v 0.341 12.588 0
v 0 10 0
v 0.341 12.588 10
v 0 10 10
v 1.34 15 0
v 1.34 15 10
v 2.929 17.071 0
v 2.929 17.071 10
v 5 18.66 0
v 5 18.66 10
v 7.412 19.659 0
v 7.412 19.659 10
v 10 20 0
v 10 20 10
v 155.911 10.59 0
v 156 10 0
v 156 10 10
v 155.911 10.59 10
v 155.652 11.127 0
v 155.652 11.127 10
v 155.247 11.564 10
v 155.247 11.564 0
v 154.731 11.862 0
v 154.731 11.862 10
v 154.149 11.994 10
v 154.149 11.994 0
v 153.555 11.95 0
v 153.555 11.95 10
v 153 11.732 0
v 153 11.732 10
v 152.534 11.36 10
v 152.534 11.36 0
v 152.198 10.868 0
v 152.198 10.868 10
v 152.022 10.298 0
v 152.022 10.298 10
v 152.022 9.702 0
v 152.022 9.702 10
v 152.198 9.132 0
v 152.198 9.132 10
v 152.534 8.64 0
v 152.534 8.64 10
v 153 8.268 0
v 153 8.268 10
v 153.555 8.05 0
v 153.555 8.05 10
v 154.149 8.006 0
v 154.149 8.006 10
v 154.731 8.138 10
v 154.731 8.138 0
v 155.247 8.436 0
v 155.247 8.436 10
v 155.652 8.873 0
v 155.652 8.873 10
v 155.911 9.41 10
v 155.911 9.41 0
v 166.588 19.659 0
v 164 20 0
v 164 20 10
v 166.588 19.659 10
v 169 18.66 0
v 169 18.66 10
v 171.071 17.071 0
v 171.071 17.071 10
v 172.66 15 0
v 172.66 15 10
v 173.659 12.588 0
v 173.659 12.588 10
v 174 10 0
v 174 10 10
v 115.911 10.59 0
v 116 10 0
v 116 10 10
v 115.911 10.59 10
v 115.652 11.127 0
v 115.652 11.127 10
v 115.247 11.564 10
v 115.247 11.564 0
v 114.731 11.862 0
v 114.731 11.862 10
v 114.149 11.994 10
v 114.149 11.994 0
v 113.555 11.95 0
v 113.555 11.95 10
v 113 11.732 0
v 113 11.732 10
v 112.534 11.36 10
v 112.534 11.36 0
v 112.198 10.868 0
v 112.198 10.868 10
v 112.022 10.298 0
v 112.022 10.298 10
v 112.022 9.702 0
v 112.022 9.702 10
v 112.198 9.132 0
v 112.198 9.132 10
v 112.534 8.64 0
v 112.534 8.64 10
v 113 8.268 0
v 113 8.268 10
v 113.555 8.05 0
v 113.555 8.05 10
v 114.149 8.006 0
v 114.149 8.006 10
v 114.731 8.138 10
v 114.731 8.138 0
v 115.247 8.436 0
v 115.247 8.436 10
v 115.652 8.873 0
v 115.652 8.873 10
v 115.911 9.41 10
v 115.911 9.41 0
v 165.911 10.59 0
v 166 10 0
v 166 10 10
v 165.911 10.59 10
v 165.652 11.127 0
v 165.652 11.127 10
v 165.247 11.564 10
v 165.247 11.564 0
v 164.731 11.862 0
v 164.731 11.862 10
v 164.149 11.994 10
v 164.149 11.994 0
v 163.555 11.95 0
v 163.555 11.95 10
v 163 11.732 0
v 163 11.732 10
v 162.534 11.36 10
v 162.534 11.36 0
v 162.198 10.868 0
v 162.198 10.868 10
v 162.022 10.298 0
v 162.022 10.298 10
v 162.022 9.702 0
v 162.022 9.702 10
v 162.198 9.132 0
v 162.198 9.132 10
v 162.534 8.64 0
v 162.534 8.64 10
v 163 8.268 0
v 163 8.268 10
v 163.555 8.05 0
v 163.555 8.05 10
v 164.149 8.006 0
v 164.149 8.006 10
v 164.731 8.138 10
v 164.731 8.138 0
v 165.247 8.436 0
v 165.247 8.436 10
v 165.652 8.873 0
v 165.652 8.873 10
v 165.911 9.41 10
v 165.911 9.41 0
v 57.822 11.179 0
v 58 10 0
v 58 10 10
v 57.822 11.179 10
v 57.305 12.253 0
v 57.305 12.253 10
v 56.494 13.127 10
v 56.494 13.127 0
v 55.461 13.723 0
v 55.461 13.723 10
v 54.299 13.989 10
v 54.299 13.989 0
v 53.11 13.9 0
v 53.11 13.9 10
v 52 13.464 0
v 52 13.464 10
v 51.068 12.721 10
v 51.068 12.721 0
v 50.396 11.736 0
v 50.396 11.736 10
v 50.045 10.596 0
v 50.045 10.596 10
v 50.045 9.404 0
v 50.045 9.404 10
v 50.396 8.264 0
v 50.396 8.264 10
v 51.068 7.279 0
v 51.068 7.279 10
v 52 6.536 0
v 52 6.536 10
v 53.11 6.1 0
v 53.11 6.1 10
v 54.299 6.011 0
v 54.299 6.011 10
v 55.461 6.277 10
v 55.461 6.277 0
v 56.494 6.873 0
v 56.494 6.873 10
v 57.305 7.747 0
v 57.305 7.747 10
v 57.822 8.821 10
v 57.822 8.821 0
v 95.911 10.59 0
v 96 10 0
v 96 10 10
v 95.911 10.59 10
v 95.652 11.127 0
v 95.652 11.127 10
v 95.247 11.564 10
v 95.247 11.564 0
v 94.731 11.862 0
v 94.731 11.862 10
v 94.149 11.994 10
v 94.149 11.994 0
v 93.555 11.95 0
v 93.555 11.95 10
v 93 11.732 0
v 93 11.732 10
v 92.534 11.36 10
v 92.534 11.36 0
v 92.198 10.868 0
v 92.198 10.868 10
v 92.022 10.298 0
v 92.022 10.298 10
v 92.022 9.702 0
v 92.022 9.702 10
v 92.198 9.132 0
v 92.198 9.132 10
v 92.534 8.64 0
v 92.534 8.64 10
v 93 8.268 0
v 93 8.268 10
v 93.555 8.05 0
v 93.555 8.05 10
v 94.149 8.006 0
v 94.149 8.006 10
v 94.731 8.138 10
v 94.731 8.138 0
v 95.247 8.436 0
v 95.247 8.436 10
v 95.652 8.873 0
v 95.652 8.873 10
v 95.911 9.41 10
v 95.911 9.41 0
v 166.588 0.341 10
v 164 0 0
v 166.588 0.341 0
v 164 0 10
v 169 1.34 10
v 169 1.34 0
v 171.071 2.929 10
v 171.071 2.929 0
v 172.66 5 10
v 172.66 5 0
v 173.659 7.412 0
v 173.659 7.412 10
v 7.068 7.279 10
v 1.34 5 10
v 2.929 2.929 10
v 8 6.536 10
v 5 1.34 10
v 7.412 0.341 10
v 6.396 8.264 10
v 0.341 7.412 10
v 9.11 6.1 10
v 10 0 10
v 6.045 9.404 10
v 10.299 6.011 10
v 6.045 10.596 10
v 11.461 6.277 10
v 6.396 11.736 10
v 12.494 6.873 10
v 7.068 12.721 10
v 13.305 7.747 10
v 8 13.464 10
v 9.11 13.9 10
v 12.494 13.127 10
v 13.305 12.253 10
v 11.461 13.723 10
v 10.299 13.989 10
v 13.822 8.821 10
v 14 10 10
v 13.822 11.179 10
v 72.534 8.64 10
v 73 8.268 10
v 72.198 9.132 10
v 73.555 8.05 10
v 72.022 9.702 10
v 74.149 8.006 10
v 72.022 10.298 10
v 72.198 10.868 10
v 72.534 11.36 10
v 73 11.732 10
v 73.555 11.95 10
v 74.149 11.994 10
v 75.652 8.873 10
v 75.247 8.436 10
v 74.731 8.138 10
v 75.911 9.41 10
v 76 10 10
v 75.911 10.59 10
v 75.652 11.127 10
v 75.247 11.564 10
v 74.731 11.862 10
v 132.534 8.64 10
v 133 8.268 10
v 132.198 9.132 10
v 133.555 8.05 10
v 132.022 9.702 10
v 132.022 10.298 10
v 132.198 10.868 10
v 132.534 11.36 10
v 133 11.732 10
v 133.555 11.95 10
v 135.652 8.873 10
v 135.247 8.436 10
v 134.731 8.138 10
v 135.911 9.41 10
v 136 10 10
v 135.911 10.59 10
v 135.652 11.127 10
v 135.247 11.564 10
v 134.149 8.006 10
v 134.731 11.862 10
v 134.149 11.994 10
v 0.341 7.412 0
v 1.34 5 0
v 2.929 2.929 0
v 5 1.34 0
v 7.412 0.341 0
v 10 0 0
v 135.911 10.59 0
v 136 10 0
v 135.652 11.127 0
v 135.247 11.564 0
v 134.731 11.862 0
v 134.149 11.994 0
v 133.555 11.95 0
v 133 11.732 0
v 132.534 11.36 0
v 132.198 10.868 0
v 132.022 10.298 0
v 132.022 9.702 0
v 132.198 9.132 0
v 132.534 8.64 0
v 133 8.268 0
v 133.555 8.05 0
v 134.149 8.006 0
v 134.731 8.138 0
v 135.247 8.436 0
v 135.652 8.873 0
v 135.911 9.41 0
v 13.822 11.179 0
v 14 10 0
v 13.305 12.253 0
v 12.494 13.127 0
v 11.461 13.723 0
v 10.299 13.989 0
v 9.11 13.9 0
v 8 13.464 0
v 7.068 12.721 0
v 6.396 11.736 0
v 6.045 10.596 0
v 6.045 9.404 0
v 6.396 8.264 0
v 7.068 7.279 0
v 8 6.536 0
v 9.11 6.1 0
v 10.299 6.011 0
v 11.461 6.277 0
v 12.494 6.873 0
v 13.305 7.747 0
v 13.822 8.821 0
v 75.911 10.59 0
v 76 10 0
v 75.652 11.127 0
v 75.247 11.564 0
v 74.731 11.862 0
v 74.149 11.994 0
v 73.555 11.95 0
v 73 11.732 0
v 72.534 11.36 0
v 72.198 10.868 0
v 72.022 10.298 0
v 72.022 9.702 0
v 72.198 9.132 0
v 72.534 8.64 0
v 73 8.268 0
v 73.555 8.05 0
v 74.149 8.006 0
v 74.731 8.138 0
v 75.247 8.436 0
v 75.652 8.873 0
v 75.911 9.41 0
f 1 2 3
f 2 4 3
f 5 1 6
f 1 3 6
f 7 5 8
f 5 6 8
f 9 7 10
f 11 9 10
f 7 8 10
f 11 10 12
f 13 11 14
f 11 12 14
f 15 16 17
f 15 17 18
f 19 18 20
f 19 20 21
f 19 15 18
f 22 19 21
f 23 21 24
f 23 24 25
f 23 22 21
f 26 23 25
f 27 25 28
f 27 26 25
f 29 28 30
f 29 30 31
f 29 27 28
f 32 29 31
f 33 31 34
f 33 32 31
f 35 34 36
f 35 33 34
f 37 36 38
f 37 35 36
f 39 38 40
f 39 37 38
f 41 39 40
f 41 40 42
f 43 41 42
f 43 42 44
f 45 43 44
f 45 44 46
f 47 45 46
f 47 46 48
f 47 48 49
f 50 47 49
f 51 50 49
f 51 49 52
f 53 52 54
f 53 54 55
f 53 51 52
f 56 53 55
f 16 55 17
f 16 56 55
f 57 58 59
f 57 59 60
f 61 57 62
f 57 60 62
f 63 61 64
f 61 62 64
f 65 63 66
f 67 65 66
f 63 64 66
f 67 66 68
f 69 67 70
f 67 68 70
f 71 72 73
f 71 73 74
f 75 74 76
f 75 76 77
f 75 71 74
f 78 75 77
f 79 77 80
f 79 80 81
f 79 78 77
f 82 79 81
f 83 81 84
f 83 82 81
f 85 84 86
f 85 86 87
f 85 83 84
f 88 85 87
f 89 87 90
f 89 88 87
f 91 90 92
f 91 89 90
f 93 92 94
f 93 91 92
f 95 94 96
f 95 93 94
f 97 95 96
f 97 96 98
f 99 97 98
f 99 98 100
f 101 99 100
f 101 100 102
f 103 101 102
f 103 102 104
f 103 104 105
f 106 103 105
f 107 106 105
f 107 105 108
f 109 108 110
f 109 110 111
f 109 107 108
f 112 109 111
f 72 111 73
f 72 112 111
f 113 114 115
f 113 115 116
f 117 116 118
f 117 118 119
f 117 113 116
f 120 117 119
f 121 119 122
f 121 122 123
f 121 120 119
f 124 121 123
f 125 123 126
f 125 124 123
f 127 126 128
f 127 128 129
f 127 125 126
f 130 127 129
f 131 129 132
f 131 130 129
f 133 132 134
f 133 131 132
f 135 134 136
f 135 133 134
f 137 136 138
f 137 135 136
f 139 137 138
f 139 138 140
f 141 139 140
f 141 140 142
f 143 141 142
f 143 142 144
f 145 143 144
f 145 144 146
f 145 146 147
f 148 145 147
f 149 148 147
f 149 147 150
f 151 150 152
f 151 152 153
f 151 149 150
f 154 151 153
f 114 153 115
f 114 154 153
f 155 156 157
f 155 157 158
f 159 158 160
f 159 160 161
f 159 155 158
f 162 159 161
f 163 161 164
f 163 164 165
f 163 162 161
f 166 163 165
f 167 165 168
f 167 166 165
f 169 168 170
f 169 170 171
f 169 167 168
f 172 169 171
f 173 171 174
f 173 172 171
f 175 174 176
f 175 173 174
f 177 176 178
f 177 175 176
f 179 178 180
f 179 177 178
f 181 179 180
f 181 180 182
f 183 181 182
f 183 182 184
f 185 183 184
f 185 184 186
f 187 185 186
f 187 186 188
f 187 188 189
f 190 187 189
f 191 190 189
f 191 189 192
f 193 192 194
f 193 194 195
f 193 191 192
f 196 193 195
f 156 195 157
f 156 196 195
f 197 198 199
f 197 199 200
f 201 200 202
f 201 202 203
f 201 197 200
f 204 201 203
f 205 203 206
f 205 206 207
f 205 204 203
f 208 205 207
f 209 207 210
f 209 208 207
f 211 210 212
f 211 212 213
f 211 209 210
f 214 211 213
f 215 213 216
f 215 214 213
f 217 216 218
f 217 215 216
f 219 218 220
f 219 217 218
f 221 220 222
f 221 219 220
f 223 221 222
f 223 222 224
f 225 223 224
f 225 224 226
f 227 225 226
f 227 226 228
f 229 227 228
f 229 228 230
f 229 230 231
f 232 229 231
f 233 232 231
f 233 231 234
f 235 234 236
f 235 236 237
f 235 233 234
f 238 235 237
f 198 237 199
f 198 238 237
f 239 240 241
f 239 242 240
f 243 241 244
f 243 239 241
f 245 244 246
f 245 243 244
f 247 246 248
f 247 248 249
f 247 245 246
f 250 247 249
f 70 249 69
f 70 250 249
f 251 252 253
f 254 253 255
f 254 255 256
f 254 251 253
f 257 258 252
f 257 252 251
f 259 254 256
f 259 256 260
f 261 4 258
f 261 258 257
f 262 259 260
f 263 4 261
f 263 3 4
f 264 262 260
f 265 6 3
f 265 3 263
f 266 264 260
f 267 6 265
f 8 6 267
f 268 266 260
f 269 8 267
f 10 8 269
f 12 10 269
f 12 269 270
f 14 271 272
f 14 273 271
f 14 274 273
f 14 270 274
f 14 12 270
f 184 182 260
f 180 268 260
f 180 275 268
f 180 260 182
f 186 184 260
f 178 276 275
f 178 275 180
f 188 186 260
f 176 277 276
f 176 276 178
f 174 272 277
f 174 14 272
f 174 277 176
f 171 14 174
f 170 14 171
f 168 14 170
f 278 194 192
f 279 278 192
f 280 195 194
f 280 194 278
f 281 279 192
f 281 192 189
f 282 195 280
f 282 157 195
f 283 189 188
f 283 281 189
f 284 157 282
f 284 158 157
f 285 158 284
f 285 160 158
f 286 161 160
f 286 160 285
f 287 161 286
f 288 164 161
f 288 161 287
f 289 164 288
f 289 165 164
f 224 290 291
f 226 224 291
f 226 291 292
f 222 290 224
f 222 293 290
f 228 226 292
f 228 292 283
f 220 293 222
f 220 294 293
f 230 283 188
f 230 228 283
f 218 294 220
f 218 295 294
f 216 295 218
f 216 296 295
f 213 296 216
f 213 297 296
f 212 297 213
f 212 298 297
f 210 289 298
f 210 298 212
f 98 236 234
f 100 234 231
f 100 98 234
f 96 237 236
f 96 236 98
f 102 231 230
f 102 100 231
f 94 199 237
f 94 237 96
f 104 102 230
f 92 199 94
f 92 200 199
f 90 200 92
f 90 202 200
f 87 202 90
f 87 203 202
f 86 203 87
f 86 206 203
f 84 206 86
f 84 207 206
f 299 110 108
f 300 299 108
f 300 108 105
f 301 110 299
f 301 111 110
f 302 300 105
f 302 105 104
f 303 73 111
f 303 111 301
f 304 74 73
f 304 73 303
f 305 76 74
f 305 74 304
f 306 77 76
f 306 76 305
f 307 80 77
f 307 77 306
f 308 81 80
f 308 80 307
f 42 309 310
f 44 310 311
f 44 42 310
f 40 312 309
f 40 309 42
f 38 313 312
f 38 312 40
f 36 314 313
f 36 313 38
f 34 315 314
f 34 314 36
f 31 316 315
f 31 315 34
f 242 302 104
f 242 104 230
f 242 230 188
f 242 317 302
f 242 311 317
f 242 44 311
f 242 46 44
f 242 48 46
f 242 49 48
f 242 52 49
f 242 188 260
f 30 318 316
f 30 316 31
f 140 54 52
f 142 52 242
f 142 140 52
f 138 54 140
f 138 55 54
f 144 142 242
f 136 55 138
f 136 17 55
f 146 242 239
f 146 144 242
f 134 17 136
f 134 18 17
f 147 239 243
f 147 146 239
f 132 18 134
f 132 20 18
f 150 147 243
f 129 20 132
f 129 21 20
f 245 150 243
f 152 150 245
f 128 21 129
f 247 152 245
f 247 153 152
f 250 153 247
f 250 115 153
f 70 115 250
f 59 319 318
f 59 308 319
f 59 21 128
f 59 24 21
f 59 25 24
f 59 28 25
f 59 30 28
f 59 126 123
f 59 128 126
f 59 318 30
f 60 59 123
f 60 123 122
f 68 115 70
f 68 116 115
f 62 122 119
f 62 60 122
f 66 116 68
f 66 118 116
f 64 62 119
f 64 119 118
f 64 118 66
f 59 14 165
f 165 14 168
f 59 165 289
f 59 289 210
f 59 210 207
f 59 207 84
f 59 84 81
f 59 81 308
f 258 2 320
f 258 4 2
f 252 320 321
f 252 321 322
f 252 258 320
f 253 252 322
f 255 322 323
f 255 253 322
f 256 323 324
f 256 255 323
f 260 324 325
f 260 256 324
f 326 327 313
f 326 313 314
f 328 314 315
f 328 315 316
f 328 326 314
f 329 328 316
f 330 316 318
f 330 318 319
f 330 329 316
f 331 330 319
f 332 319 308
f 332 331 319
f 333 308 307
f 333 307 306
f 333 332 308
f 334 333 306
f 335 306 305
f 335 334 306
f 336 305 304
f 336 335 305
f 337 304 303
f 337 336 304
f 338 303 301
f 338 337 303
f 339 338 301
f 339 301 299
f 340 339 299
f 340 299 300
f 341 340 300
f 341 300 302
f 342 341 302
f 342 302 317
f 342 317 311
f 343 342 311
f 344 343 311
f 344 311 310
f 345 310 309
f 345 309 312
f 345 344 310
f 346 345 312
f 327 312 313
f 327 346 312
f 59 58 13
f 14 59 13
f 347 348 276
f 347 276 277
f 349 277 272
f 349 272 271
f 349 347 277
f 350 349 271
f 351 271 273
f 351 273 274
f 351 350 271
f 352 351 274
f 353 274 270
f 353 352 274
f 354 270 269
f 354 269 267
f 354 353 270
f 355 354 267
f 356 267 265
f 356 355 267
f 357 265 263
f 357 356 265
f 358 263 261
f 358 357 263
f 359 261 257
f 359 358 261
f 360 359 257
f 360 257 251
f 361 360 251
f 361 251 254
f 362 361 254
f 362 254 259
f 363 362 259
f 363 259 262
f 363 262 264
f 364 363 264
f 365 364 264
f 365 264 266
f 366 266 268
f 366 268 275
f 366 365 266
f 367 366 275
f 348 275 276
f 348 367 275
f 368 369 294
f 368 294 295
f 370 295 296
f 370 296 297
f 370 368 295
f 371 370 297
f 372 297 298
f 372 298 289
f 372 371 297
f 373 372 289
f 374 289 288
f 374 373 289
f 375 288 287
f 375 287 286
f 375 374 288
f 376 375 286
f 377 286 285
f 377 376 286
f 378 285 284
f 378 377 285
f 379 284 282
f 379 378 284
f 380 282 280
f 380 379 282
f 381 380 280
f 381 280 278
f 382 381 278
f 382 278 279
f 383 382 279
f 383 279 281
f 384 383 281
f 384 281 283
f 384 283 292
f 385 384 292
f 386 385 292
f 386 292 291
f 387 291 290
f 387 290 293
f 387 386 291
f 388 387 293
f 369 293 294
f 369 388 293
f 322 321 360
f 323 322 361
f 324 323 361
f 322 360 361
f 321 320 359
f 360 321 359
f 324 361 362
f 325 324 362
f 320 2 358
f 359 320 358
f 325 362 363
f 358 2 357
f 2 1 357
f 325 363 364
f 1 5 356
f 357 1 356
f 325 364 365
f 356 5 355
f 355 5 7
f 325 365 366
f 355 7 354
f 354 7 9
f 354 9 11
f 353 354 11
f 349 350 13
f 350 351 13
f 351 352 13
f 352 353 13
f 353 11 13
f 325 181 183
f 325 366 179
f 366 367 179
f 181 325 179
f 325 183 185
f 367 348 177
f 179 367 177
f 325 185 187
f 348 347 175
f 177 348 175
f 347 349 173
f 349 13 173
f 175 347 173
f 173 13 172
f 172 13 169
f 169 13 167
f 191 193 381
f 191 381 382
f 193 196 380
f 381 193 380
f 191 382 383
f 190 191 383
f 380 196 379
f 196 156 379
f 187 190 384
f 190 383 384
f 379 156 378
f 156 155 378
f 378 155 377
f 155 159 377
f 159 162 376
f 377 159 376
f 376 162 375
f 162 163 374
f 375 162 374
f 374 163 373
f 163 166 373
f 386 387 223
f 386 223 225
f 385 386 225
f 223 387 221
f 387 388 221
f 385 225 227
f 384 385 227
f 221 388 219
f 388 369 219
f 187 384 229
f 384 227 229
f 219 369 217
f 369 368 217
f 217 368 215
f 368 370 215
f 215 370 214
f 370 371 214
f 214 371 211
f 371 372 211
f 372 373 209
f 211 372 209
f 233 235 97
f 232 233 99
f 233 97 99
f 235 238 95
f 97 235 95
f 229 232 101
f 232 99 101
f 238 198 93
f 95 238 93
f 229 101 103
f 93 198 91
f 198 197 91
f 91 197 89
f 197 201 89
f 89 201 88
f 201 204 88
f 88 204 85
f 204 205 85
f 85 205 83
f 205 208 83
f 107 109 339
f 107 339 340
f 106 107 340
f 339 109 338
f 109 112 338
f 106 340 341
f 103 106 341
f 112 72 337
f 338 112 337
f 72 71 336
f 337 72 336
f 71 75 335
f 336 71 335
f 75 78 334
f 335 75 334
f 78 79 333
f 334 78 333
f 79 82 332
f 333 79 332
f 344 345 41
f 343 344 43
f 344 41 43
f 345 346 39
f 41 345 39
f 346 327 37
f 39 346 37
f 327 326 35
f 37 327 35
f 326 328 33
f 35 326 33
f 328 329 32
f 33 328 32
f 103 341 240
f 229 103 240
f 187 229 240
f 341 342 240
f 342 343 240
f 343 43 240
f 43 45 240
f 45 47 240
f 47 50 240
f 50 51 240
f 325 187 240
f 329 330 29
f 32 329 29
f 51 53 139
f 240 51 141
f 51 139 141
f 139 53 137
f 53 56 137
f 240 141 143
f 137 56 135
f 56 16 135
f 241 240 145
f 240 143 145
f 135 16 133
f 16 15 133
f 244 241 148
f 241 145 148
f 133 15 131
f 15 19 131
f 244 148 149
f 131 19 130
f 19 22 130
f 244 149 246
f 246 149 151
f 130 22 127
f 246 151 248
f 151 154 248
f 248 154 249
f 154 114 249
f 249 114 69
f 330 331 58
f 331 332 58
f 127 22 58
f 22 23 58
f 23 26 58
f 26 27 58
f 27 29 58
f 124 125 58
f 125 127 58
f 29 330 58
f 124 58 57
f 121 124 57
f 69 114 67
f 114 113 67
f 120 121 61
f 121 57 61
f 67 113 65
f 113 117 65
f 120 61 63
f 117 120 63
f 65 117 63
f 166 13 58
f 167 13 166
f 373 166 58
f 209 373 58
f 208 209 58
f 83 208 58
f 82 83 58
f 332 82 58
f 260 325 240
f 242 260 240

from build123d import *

# Parameters (mm, degrees)
ESQUISSE1_R        = 4
ESQUISSE1_R_2      = 2
BOSS_EXTRU_1_DEPTH = 10
CONG_1_R           = 10


with BuildPart() as part:
    # Esquisse1 → Boss.-Extru.1 (new body)
    with BuildSketch(Plane.XY):
        Polygon((0, 20), (0, 0), (60, 0), (154, 0), (174, 0), (174, 20), (154, 20), (60, 20), align=None)
        with Locations((10, 10)):
            Circle(ESQUISSE1_R, mode=Mode.SUBTRACT)
        with Locations((54, 10)):
            Circle(ESQUISSE1_R, mode=Mode.SUBTRACT)
        with Locations((154, 10)):
            Circle(ESQUISSE1_R_2, mode=Mode.SUBTRACT)
        with Locations((164, 10)):
            Circle(ESQUISSE1_R_2, mode=Mode.SUBTRACT)
        with Locations((74, 10)):
            Circle(ESQUISSE1_R_2, mode=Mode.SUBTRACT)
        with Locations((94, 10)):
            Circle(ESQUISSE1_R_2, mode=Mode.SUBTRACT)
        with Locations((114, 10)):
            Circle(ESQUISSE1_R_2, mode=Mode.SUBTRACT)
        with Locations((134, 10)):
            Circle(ESQUISSE1_R_2, mode=Mode.SUBTRACT)
    extrude(amount=BOSS_EXTRU_1_DEPTH)

    # Congé1
    cong_1_edges = [part.edges().sort_by_distance(p)[0] for p in [
        (0, 0, 5),
        (0, 20, 5),
        (174, 0, 5),
        (174, 20, 5),
    ]]
    fillet(cong_1_edges, radius=CONG_1_R - 0.0001)  # a hair under: the kernel refuses the full size


solid = part.part
